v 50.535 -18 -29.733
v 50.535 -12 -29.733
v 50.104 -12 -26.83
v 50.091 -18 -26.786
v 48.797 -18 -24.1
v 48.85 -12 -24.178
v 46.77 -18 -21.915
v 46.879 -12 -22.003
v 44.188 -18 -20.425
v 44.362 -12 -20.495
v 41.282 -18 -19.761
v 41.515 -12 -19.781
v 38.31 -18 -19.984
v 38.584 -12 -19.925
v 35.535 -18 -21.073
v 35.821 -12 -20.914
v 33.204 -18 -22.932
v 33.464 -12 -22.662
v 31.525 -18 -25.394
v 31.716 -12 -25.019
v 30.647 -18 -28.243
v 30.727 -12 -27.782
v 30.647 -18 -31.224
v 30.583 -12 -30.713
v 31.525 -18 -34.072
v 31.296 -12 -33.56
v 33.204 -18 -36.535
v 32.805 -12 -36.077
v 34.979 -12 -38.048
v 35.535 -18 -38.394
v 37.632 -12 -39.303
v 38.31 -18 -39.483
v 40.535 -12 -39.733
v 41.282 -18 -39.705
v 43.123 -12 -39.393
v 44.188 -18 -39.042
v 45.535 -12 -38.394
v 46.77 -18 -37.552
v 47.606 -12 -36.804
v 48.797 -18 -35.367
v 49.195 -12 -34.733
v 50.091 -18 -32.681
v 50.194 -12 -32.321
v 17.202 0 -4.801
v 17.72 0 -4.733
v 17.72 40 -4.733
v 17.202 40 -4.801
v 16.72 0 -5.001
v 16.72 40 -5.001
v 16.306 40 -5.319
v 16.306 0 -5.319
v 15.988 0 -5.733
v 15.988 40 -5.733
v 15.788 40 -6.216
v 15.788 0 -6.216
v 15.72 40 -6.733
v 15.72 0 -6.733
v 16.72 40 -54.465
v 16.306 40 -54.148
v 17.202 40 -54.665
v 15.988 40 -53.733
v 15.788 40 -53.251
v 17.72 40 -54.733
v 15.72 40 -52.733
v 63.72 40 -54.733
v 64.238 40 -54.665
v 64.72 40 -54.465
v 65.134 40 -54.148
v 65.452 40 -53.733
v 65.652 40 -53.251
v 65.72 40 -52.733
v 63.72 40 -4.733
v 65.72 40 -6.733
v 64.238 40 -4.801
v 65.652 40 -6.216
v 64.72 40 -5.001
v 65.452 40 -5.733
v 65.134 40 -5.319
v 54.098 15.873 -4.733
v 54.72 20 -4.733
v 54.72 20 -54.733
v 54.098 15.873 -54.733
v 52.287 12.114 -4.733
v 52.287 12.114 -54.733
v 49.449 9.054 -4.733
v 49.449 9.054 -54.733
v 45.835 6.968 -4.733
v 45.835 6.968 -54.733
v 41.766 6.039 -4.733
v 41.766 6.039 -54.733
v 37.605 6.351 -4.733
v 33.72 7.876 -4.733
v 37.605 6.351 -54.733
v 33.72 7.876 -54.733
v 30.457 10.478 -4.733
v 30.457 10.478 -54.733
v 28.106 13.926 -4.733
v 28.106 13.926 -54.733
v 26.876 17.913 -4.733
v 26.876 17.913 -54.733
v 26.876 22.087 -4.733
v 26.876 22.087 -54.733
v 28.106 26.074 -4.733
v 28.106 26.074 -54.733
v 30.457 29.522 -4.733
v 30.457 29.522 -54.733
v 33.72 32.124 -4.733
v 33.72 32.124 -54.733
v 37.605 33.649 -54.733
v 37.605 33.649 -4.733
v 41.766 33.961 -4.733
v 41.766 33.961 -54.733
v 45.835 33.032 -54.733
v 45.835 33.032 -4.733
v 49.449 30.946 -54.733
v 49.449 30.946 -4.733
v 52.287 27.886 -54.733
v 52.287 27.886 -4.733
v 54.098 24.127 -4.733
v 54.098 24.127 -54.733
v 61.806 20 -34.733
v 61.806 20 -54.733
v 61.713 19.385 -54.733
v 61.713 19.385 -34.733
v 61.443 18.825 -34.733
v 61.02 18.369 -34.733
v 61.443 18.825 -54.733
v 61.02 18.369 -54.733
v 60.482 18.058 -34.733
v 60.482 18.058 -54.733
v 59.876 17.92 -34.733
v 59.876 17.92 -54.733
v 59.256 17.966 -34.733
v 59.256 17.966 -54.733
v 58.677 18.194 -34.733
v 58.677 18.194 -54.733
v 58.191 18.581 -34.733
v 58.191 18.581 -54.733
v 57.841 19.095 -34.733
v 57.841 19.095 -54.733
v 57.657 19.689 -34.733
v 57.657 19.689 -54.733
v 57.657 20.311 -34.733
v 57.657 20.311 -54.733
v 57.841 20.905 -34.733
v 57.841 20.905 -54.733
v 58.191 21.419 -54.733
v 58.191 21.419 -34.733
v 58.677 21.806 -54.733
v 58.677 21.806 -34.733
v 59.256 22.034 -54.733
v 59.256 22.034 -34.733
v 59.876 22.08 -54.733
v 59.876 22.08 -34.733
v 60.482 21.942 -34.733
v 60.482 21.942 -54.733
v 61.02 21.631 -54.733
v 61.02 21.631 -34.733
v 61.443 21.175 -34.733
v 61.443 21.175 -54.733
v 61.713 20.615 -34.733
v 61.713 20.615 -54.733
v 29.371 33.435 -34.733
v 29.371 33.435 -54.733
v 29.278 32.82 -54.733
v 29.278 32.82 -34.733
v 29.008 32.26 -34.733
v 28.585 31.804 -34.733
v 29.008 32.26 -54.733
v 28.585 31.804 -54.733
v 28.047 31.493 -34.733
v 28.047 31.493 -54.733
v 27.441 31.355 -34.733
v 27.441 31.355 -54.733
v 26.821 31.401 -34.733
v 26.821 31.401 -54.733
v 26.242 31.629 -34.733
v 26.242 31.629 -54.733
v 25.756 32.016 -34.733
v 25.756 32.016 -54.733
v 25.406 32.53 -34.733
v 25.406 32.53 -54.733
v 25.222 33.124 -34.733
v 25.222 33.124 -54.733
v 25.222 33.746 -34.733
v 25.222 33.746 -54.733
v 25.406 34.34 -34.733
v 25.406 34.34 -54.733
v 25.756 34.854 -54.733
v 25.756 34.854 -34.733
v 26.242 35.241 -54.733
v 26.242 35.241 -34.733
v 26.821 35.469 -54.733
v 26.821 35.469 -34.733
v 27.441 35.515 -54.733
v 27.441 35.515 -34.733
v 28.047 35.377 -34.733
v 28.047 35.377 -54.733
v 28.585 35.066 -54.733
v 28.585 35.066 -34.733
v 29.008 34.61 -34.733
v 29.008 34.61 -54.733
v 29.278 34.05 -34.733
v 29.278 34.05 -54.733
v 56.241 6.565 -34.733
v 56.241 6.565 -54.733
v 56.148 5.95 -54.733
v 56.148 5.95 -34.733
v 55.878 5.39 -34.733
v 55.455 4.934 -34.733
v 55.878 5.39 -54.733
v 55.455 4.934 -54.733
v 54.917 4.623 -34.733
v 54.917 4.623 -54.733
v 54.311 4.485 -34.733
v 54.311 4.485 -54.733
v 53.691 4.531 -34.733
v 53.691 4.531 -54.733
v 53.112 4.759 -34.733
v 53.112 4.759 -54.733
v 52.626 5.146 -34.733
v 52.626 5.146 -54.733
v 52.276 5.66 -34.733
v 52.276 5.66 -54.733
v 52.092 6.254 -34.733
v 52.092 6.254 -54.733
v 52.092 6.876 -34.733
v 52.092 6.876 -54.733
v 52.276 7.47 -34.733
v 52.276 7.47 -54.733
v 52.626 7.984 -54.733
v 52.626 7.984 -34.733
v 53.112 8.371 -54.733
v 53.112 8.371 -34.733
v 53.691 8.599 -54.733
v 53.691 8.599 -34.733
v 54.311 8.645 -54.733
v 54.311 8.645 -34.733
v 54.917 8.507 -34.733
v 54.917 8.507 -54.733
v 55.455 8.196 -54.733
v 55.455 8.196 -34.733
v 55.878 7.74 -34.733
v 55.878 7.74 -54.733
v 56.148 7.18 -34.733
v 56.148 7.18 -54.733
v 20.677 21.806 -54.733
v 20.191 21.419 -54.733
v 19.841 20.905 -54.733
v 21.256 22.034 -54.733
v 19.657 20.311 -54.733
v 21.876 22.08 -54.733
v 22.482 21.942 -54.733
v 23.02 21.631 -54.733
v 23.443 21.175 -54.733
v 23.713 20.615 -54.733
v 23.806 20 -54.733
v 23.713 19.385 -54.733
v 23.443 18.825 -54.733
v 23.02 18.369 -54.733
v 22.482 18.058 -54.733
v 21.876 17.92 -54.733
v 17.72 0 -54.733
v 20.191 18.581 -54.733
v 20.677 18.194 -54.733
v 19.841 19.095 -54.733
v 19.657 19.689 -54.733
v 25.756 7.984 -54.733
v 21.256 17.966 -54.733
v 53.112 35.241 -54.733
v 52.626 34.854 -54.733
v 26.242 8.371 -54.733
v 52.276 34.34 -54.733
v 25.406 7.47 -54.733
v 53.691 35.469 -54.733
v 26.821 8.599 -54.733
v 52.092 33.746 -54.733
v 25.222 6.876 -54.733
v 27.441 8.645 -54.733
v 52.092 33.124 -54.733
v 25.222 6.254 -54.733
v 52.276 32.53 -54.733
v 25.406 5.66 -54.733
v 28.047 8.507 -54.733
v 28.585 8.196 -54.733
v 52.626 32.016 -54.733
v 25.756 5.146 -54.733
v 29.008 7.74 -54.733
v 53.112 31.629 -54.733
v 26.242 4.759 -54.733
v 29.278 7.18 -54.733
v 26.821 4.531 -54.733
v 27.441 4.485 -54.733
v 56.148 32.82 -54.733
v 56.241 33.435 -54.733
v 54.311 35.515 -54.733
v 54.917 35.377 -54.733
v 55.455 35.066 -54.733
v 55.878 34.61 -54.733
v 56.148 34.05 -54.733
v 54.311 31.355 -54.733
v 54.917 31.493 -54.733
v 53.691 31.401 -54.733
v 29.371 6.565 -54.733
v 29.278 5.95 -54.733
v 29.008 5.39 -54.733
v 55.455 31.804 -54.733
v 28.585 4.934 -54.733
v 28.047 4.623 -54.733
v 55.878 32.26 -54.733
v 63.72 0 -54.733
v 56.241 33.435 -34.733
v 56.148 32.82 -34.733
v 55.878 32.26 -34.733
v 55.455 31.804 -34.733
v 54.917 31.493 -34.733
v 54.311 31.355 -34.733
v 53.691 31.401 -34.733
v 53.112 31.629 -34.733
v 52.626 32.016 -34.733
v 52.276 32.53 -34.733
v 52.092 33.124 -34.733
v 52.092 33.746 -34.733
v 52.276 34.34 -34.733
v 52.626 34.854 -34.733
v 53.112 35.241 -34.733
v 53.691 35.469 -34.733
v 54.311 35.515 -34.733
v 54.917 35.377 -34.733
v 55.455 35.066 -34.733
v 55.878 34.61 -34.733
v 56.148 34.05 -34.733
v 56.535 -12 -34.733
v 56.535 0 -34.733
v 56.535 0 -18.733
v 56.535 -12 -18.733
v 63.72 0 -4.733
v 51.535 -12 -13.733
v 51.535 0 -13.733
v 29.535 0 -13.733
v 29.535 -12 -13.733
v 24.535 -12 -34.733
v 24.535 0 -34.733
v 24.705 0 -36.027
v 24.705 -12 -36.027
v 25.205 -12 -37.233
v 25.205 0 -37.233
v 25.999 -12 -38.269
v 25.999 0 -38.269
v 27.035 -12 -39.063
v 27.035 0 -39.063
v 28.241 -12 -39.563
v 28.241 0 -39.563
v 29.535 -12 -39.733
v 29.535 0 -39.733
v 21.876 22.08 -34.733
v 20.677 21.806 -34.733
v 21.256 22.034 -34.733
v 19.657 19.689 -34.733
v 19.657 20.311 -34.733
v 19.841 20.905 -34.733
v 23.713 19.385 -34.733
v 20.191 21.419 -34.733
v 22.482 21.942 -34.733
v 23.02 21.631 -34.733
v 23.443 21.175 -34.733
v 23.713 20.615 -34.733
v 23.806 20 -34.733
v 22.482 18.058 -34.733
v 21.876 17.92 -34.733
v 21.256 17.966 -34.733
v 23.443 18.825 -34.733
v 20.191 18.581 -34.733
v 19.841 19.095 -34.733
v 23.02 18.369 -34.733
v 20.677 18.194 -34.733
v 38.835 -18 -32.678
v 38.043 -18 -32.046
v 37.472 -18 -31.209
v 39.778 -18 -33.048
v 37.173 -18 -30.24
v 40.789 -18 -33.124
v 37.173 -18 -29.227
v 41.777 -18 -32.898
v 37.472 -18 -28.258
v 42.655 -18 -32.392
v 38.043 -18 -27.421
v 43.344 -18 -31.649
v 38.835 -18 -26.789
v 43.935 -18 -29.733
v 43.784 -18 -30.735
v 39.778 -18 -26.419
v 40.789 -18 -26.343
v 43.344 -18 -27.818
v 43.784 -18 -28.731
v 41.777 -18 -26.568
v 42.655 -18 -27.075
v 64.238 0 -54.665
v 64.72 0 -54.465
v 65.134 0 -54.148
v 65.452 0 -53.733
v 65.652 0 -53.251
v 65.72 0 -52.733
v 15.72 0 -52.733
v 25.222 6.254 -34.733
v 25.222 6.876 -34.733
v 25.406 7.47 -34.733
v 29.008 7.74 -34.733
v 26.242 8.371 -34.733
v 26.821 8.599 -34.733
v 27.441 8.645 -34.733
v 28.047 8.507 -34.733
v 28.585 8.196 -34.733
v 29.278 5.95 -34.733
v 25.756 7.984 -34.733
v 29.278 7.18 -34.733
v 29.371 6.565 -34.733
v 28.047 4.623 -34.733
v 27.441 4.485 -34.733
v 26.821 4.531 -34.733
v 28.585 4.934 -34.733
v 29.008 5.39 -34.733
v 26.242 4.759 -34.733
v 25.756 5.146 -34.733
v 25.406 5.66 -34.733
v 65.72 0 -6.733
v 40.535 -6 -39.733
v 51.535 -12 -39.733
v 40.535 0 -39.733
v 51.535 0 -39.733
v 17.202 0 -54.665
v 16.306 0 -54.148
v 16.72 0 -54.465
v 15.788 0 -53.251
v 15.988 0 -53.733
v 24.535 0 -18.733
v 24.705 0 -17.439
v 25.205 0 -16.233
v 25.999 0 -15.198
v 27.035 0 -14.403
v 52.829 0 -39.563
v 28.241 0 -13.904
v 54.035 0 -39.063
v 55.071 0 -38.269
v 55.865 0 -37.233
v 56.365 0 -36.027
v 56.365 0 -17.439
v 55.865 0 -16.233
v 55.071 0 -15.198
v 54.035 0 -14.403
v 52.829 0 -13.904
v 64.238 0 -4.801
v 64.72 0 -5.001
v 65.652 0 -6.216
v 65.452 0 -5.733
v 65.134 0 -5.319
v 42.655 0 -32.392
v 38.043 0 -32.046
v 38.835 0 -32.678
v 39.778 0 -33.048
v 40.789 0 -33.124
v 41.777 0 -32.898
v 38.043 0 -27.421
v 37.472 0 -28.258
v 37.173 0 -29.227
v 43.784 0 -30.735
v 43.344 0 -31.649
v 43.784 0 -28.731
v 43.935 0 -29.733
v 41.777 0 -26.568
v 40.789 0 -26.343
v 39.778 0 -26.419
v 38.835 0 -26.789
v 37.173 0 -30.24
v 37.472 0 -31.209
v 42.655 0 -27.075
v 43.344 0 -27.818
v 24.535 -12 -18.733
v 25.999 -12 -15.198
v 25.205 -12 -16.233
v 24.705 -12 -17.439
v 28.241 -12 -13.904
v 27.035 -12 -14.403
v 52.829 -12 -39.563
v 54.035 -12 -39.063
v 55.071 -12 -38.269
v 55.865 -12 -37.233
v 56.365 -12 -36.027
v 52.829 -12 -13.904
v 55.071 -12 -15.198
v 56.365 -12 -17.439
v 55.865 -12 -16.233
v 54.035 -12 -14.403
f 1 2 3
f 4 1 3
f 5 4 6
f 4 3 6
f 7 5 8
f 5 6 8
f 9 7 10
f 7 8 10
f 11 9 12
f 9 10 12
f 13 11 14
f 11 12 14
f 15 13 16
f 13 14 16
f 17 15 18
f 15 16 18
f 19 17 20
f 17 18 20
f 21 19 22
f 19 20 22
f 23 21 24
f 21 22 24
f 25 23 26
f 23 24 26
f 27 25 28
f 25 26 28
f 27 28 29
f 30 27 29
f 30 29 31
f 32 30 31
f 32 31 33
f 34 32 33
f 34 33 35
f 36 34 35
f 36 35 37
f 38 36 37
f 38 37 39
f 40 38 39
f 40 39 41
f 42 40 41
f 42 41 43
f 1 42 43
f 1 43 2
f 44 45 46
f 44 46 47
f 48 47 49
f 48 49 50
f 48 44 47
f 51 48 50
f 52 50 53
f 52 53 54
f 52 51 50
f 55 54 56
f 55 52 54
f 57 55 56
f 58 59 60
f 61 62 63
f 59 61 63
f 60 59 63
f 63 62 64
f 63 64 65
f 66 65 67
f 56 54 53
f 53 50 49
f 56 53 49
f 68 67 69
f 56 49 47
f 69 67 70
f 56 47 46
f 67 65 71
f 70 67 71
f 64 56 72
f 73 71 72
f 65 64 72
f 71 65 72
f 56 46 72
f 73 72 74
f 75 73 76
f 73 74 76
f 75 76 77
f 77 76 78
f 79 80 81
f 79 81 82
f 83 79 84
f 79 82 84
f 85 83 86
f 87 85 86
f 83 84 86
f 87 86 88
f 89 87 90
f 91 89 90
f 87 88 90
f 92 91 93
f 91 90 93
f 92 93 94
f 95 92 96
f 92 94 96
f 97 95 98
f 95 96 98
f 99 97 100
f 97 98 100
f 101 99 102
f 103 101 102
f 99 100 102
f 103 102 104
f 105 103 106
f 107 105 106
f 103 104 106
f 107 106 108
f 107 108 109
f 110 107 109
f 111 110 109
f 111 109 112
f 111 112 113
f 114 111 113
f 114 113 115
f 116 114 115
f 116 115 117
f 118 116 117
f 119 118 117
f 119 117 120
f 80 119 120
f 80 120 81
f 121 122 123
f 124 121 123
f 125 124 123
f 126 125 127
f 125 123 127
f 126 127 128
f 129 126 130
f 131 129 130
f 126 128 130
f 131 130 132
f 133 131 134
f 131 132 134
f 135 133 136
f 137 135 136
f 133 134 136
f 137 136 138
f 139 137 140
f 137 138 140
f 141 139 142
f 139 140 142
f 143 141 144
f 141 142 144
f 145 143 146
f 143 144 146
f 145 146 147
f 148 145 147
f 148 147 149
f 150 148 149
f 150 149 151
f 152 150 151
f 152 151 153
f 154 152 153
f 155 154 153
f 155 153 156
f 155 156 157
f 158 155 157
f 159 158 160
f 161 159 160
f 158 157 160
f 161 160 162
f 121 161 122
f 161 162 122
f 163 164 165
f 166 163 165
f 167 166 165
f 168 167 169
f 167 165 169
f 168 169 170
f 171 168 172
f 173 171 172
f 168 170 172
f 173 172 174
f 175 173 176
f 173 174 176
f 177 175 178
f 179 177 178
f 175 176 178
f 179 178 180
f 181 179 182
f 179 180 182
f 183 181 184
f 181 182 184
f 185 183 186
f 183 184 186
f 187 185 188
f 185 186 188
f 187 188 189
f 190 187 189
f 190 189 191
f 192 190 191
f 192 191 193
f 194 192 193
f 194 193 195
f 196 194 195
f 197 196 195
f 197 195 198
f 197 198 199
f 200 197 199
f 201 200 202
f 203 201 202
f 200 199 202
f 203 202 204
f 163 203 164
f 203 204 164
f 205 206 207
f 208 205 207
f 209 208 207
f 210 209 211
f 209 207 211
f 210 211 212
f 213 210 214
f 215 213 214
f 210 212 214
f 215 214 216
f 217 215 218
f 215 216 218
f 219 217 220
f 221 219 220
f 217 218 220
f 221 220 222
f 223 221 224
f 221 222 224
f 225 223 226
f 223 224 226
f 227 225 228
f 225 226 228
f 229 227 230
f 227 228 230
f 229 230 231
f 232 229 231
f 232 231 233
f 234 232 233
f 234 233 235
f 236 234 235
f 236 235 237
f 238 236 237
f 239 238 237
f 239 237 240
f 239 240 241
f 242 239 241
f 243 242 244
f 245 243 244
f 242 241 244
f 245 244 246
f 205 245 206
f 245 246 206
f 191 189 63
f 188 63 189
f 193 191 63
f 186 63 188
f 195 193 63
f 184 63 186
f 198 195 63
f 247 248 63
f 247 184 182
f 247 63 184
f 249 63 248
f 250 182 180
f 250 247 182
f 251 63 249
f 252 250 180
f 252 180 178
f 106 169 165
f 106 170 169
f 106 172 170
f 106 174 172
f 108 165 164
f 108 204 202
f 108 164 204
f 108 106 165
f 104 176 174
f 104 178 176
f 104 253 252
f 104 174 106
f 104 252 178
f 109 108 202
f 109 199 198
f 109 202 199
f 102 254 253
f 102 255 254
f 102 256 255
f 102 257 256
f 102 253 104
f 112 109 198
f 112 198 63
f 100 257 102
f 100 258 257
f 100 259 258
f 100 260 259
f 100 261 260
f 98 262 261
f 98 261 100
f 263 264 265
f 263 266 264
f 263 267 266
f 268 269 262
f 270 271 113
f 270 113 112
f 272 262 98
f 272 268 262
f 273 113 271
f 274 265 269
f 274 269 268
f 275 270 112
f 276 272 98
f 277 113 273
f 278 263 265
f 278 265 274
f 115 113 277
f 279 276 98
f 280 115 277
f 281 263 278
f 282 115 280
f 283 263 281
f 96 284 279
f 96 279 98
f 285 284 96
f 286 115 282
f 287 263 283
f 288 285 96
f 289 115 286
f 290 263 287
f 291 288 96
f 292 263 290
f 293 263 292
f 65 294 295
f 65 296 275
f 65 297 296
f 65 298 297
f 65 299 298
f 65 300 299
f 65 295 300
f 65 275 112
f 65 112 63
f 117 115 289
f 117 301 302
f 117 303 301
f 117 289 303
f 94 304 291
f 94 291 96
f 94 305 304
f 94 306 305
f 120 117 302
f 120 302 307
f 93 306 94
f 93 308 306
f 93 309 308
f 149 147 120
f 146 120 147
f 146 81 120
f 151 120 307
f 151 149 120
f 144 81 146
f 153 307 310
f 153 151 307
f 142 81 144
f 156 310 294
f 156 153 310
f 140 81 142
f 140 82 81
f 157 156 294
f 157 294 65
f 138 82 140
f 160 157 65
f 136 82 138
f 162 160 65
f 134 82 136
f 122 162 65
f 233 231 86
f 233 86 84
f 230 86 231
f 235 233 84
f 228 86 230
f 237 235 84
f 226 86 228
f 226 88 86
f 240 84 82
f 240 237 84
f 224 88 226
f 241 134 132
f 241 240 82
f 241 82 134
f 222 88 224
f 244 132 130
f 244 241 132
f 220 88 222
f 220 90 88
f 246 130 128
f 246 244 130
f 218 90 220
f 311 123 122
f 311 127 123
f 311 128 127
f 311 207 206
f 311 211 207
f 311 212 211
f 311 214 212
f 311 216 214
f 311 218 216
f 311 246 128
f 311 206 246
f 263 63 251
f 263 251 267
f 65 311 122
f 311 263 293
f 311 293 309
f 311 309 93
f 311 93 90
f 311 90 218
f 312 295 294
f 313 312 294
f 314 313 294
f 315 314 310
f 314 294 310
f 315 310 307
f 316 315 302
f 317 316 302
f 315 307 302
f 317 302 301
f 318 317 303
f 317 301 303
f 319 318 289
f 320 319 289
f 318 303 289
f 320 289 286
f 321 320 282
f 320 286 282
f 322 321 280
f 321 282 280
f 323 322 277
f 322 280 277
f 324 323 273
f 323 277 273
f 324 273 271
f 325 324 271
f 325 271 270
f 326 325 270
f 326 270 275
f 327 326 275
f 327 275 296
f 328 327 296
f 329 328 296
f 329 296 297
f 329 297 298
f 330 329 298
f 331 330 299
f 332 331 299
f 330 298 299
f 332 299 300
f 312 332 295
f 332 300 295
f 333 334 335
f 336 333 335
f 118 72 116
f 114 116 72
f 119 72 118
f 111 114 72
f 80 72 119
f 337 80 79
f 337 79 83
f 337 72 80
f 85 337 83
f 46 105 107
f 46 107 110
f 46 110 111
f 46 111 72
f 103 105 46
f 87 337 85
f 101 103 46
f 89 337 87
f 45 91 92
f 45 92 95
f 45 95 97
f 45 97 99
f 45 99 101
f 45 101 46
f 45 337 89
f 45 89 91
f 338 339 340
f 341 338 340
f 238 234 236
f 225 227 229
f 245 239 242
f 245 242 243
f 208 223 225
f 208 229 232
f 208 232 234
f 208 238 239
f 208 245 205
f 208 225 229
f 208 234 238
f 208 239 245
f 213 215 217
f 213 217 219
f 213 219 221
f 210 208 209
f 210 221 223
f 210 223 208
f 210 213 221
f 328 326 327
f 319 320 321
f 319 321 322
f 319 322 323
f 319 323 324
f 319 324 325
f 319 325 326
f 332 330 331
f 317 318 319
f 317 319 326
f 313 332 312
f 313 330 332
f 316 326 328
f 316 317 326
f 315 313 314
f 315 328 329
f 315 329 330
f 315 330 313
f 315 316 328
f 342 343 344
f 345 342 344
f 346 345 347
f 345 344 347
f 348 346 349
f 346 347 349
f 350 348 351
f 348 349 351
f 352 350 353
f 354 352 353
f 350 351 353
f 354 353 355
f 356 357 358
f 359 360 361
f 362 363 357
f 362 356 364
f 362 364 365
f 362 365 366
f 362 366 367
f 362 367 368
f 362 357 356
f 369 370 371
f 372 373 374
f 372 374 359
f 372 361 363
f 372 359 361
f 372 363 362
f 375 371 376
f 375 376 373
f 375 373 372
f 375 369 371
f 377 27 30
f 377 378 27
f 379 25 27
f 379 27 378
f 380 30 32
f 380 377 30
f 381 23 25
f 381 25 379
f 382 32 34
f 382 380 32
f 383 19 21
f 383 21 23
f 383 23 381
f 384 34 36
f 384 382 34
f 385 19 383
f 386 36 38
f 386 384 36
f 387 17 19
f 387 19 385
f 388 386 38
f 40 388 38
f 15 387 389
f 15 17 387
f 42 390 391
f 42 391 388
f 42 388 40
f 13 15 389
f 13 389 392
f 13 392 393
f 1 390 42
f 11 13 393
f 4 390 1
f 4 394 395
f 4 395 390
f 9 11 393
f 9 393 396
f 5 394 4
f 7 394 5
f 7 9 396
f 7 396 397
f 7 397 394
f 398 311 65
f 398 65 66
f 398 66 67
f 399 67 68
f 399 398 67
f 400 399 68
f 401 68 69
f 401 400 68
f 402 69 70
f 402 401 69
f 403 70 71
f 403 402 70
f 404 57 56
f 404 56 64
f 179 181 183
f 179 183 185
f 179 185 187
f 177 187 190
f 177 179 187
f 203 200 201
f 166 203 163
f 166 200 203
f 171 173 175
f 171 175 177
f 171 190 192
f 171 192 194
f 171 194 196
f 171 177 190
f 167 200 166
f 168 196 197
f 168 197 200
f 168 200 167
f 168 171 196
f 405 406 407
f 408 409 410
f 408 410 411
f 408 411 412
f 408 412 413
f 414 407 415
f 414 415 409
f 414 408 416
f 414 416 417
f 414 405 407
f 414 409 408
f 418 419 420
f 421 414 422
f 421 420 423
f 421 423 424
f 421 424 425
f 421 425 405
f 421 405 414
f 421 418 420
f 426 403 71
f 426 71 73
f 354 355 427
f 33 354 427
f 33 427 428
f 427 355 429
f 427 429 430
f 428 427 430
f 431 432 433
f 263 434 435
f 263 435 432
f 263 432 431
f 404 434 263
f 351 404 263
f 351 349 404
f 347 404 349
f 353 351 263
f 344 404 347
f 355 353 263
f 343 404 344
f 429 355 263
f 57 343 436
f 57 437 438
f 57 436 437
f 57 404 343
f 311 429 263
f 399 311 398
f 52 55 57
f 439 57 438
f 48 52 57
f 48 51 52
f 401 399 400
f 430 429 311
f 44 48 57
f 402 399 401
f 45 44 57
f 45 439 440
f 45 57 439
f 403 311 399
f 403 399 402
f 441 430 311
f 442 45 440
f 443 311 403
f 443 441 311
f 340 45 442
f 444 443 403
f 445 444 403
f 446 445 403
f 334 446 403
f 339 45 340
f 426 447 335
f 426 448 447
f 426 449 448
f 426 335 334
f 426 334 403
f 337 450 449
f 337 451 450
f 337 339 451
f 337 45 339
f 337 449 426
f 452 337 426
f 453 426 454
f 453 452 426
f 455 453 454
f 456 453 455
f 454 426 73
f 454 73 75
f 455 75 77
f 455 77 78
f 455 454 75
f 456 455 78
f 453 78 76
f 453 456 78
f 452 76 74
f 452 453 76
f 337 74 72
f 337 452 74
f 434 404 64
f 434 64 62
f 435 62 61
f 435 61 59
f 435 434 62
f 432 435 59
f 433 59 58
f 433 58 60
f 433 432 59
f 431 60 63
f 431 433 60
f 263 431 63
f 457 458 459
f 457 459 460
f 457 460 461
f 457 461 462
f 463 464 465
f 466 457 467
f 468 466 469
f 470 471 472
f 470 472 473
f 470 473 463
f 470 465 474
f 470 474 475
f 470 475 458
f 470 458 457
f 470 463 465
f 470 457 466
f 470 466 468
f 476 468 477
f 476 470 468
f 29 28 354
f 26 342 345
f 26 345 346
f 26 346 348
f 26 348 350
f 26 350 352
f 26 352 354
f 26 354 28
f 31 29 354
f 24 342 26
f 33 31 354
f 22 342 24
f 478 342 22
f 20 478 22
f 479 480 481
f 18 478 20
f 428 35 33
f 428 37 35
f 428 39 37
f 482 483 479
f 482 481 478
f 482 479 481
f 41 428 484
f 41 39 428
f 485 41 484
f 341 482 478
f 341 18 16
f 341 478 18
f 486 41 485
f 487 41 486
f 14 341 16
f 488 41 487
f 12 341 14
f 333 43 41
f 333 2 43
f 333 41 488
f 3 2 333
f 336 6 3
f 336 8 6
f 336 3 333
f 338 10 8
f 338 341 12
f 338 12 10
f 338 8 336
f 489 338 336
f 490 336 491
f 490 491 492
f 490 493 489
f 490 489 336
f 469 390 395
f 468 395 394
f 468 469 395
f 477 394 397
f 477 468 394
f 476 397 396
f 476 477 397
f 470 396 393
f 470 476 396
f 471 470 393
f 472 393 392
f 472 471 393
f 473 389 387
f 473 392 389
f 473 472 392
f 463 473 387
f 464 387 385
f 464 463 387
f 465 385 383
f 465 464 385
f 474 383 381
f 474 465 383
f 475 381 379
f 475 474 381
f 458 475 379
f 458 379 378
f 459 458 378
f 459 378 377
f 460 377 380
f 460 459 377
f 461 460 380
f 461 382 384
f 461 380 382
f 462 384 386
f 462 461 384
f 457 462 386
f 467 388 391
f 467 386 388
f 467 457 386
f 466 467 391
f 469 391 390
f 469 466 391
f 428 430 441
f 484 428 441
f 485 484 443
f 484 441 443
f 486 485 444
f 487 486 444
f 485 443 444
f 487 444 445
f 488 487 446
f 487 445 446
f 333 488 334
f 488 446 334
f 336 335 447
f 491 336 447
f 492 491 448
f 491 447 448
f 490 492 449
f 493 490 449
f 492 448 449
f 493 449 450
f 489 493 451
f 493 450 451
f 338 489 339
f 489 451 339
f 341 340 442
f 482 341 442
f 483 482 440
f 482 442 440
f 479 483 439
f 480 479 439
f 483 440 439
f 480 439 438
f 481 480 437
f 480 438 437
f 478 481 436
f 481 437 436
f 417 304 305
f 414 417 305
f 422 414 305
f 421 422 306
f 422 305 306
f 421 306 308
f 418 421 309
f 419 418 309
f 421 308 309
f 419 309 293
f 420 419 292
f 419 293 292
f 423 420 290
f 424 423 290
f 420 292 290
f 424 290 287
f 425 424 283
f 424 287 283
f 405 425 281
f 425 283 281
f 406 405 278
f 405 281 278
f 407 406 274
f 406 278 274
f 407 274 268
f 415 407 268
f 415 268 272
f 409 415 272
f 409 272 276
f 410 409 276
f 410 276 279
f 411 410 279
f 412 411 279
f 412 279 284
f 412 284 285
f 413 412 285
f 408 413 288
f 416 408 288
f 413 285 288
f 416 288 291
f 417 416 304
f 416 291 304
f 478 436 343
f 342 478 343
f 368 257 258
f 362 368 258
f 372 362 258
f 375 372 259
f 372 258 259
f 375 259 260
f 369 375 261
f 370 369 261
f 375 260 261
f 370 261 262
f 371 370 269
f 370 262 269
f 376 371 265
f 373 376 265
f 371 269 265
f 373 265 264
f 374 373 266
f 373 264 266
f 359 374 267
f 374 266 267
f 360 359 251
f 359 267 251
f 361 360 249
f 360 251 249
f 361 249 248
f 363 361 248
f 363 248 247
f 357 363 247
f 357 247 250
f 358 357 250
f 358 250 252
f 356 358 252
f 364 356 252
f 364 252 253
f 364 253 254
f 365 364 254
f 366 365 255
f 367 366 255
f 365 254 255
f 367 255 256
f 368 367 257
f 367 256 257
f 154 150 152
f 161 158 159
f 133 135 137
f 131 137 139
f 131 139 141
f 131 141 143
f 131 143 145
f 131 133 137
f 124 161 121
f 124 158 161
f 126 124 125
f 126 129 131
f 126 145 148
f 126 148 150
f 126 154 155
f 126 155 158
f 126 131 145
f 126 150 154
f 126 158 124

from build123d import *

# Parameters (mm, degrees)
F4_DEPTH  = 12
F2_R      = 10
F5_DEPTH  = 6
F3_R      = 3.4
F6_DEPTH  = 18.001
F7_DEPTH  = 40
F9_R      = 14
F10_DEPTH = 50.001
F9_R_2    = 2.085835
F11_DEPTH = 20
F12_R     = 10
F13_DEPTH = 6
F14_DEPTH = 25


with BuildPart() as f4:
    # F1 (on face) → F4 (new body)
    with BuildSketch(Plane.XZ):
        with BuildLine():
            Line((51.534967, -13.733306), (29.534967, -13.733306))
            ThreePointArc((29.534967, -13.733306), (25.999433, -15.197772), (24.534967, -18.733306))
            Line((24.534967, -18.733306), (24.534967, -34.733306))
            ThreePointArc((24.534967, -34.733306), (25.999433, -38.26884), (29.534967, -39.733306))
            Line((29.534967, -39.733306), (51.534967, -39.733306))
            ThreePointArc((51.534967, -39.733306), (55.070501, -38.26884), (56.534967, -34.733306))
            Line((56.534967, -34.733306), (56.534967, -18.733306))
            ThreePointArc((56.534967, -18.733306), (55.070501, -15.197772), (51.534967, -13.733306))
        make_face()
    extrude(amount=F4_DEPTH)

    # F2 (on face) → F5 (join)
    with BuildSketch(Plane.XZ.offset(12)):
        with Locations((40.534967, -29.733306)):
            Circle(F2_R)
    extrude(amount=F5_DEPTH)

    # F3 (on face) → F6 (cut, through all)
    with BuildSketch(Plane.XZ):
        with Locations((40.534967, -29.733306)):
            Circle(F3_R)
    extrude(amount=F6_DEPTH, mode=Mode.SUBTRACT)

    # F0 (on Front) → F7 (join)
    with BuildSketch(Plane.XZ):
        with BuildLine():
            Line((63.719967, -4.733306), (17.719967, -4.733306))
            ThreePointArc((17.719967, -4.733306), (16.305754, -5.319092), (15.719967, -6.733306))
            Line((15.719967, -6.733306), (15.719967, -52.733306))
            ThreePointArc((15.719967, -52.733306), (16.305754, -54.147519), (17.719967, -54.733306))
            Line((17.719967, -54.733306), (63.719967, -54.733306))
            ThreePointArc((63.719967, -54.733306), (65.134181, -54.147519), (65.719967, -52.733306))
            Line((65.719967, -52.733306), (65.719967, -6.733306))
            ThreePointArc((65.719967, -6.733306), (65.134181, -5.319092), (63.719967, -4.733306))
        make_face()
    extrude(amount=-F7_DEPTH)

    # F9 (on face) → F10 (cut, through all)
    with BuildSketch(Plane(origin=(0, 0, -54.733306), x_dir=(1, 0, 0), z_dir=(0, 0, -1))):
        with Locations((40.719967, -20)):
            Circle(F9_R)
    extrude(amount=-F10_DEPTH, mode=Mode.SUBTRACT)

    # F9 (on face) → F11 (cut)
    with BuildSketch(Plane(origin=(0, 0, -54.733306), x_dir=(1, 0, 0), z_dir=(0, 0, -1))):
        with Locations((27.284938, -6.564971)):
            Circle(F9_R_2)
        with Locations((21.719967, -20)):
            Circle(F9_R_2)
        with Locations((27.284938, -33.435029)):
            Circle(F9_R_2)
        with Locations((54.154996, -6.564971)):
            Circle(F9_R_2)
        with Locations((59.719967, -20)):
            Circle(F9_R_2)
        with Locations((54.154996, -33.435029)):
            Circle(F9_R_2)
    extrude(amount=-F11_DEPTH, mode=Mode.SUBTRACT)

    # F12 (on face) → F13 (join)
    with BuildSketch(Plane.XZ):
        with Locations((40.534967, -29.733306)):
            Circle(F12_R)
    extrude(amount=F13_DEPTH)

    # F3 (on face) → F14 (cut)
    with BuildSketch(Plane.XZ):
        with Locations((40.534967, -29.733306)):
            Circle(F3_R)
    extrude(amount=F14_DEPTH, mode=Mode.SUBTRACT)


solid = f4.part
